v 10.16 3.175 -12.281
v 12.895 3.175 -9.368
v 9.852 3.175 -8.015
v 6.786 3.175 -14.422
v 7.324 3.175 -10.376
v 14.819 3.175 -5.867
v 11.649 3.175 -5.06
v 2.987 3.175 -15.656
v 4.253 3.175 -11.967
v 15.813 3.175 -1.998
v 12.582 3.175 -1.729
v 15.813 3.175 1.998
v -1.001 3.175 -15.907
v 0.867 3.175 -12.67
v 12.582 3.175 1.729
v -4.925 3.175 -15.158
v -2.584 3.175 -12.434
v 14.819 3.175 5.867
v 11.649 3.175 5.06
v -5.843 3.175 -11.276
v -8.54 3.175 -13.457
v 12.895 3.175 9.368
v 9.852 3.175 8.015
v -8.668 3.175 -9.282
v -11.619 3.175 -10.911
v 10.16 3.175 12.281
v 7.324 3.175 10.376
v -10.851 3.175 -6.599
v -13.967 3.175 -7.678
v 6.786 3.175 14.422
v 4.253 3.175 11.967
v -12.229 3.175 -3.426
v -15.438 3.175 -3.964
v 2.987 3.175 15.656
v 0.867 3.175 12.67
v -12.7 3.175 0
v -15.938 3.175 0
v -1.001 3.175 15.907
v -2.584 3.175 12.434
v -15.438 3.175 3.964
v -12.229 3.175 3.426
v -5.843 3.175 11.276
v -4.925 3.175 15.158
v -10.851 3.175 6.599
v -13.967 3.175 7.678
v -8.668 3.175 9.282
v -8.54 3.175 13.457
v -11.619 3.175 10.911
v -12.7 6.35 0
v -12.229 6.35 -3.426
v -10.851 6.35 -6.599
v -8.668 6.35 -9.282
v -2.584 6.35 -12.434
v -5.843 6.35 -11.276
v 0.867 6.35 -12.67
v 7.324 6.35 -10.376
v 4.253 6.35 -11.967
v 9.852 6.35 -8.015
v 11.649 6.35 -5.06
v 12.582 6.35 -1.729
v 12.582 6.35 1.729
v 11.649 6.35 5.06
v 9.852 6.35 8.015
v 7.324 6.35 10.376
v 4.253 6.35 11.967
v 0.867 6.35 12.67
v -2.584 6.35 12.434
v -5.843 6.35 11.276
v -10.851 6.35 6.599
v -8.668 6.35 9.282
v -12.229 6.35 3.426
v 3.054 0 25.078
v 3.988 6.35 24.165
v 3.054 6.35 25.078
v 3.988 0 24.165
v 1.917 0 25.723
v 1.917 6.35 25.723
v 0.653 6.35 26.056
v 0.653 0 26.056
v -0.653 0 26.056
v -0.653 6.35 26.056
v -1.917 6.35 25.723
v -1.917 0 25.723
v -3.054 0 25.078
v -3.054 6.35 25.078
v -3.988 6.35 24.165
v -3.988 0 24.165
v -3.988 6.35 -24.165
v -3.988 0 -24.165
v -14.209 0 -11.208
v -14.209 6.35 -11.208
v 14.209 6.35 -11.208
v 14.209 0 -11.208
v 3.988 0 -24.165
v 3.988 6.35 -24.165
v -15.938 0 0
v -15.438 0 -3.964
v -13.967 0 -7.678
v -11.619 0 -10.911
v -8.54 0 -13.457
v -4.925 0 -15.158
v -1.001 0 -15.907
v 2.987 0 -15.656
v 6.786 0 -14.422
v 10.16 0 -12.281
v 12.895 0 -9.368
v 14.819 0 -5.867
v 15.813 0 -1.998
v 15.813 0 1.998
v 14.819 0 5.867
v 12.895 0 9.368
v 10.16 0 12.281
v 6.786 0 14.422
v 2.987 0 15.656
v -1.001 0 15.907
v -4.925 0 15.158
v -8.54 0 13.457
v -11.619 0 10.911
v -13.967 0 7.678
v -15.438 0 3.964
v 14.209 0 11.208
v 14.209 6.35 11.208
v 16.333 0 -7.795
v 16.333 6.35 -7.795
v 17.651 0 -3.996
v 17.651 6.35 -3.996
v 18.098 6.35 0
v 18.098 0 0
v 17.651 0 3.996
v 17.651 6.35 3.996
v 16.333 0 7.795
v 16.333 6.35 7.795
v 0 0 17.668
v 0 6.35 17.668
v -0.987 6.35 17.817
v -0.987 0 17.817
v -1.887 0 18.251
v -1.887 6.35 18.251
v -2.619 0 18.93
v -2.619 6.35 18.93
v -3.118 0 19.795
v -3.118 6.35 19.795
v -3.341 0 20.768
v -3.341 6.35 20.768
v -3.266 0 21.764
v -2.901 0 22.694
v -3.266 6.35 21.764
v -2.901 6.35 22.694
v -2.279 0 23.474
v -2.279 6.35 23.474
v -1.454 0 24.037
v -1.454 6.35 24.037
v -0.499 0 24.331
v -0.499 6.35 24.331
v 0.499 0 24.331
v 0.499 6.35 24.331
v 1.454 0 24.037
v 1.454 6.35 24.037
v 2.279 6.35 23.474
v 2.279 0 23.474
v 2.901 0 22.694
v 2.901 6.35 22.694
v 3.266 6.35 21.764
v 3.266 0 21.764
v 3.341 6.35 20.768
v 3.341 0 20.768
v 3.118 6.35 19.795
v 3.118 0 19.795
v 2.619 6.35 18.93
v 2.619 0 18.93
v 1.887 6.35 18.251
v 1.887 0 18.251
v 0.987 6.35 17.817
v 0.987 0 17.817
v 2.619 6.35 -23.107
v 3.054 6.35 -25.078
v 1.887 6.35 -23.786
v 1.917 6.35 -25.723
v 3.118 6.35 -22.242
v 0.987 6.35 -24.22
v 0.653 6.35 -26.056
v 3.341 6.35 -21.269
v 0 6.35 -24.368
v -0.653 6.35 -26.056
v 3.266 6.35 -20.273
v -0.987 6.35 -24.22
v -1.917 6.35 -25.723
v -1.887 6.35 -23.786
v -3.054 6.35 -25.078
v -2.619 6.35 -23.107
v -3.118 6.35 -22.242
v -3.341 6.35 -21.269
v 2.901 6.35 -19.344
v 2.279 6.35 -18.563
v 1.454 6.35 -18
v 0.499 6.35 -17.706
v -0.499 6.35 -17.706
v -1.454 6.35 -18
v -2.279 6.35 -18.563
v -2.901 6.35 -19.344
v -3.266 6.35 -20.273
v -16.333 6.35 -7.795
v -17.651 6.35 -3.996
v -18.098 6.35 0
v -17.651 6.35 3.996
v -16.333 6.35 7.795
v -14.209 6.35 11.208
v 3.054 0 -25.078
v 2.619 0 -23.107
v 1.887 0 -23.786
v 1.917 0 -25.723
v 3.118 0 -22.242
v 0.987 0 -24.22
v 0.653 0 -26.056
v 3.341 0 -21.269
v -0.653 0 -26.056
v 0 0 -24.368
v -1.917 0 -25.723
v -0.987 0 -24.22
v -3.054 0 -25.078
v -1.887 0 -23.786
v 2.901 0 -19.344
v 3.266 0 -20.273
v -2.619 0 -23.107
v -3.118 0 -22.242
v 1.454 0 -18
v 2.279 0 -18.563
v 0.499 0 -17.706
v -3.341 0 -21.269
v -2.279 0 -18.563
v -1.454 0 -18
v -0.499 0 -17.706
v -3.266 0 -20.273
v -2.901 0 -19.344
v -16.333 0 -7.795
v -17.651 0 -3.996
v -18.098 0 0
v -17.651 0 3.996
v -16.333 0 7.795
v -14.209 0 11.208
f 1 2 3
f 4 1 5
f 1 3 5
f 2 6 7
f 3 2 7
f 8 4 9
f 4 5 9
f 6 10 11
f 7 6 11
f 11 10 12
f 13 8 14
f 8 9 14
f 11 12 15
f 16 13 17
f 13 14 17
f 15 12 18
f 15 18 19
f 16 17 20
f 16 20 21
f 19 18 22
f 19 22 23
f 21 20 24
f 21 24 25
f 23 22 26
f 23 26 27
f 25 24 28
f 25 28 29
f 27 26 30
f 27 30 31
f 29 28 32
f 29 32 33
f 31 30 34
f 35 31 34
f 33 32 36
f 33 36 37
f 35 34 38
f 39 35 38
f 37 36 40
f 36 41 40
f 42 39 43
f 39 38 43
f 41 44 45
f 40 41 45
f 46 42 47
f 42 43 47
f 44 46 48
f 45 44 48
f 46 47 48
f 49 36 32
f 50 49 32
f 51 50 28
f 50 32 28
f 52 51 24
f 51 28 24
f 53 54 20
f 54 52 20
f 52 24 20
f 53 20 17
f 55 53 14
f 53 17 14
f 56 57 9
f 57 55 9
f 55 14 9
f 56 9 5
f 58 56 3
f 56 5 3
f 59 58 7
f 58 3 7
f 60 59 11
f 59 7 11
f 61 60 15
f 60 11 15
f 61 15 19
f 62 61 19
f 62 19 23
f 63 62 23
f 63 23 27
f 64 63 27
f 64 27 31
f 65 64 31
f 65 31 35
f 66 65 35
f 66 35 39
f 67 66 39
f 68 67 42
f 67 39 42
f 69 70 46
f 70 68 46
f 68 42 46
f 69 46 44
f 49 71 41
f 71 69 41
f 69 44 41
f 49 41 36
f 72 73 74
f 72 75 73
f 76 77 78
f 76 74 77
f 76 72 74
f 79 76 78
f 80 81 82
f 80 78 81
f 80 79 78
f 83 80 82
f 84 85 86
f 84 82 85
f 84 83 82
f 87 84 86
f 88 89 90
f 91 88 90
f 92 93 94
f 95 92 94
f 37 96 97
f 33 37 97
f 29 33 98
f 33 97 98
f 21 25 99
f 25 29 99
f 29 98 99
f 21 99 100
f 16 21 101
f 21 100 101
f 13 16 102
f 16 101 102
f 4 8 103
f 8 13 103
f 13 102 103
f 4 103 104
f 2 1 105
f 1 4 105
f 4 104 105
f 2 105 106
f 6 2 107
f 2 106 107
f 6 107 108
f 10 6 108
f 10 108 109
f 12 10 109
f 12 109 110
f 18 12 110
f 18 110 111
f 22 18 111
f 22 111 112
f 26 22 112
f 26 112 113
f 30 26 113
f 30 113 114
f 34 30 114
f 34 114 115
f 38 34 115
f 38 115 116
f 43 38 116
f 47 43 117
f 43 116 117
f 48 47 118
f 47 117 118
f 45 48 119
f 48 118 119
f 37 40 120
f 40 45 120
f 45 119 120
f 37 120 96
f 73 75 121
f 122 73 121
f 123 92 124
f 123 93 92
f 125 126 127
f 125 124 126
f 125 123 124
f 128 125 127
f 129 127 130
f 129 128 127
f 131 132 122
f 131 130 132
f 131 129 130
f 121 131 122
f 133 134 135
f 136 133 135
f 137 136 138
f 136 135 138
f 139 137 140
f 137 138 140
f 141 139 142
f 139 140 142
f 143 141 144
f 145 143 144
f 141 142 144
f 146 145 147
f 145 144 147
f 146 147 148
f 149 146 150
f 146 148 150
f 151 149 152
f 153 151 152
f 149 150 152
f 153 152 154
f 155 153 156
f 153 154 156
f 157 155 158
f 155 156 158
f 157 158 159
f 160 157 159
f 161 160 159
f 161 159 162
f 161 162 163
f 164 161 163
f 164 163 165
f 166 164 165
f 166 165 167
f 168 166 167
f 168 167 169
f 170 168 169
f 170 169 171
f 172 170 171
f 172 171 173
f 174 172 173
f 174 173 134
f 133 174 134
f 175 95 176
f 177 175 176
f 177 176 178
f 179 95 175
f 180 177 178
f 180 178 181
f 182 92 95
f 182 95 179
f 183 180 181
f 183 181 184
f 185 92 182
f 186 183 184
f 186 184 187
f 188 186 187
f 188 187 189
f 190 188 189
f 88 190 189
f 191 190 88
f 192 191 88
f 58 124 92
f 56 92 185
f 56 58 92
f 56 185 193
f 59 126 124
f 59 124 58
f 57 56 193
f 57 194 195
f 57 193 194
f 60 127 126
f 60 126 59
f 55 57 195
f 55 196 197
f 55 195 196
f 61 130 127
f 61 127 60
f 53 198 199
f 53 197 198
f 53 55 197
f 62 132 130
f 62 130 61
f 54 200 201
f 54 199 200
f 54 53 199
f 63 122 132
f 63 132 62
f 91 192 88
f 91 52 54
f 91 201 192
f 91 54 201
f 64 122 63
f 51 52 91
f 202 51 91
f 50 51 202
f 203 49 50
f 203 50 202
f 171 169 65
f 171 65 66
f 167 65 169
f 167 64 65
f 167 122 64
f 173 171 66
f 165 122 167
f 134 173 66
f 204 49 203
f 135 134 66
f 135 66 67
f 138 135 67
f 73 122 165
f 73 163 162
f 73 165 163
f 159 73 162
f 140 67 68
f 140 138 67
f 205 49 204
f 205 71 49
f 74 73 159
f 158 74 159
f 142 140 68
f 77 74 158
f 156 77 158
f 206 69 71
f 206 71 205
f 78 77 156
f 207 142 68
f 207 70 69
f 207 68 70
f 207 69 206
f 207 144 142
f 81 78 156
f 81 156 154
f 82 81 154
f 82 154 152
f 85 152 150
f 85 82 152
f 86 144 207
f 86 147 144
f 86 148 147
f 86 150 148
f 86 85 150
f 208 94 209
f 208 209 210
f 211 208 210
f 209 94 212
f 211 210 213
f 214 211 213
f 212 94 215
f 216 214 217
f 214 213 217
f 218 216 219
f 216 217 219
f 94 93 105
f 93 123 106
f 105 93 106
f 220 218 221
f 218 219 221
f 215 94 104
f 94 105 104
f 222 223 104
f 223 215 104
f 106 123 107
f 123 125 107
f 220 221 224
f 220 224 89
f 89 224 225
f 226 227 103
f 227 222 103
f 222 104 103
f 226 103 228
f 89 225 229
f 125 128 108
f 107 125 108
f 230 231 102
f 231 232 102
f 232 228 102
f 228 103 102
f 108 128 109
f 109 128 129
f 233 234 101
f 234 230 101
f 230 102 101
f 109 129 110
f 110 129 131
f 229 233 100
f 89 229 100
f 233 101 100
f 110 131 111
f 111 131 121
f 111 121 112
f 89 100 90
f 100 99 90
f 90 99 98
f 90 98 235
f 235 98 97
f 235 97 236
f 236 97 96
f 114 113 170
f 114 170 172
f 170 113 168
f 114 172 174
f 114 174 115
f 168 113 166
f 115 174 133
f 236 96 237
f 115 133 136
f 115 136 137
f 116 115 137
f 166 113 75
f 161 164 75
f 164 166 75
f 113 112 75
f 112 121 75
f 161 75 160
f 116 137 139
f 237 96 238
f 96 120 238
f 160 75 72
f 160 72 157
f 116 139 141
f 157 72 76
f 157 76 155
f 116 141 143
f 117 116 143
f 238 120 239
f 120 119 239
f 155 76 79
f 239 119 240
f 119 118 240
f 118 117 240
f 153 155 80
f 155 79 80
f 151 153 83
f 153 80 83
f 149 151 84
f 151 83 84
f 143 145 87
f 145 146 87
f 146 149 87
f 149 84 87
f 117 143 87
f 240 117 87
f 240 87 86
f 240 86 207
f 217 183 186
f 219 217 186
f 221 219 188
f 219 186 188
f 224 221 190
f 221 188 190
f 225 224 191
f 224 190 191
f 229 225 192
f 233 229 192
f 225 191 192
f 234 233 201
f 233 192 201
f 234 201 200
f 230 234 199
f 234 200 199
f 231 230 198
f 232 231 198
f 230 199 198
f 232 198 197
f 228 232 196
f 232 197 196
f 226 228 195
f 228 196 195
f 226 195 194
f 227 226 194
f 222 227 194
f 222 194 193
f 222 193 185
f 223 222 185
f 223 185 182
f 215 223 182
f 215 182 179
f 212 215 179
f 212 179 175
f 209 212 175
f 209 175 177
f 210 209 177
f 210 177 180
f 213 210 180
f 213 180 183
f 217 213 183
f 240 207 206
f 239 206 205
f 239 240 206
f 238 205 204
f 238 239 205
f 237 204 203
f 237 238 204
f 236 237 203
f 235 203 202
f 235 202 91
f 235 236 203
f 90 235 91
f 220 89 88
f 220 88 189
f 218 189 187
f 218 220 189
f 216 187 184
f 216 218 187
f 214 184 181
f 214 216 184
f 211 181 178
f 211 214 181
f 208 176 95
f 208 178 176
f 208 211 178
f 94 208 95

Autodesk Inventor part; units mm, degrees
ref_plane "YZ Plane" through (0, 0, 0) normal (1, 0, 0) x (0, 1, 0)
ref_plane "XZ Plane" through (0, 0, 0) normal (0, 1, 0) x (-1, 0, 0)
ref_plane "XY Plane" through (0, 0, 0) normal (0, 0, 1) x (1, 0, 0)
sketch "Sketch1" plane through (0, 0, 0) normal (0, 1, 0) x (-1, 0, 0)
  circle A0 centre (0, 0) radius 12.7
  circle A1 centre (0, 0) radius 18.0975
  circle A2 centre (0, 21.0185) radius 5.08 construction
  circle A3 centre (0, -21.0185) radius 5.08 construction
  line L0 (3.9884, 24.1647) -> (14.2088, 11.2084)
  line L1 (-3.9884, 24.1647) -> (-14.2088, 11.2084)
  line L2 (-14.2088, -11.2084) -> (-3.9884, -24.1647)
  line L3 (3.9884, -24.1647) -> (14.2088, -11.2084)
  arc A4 (14.2088, -11.2084) -> (14.2088, 11.2084) centre (0, 0) ccw
  arc A5 (-3.9884, -24.1647) -> (3.9884, -24.1647) centre (0, -21.0185) ccw
  arc A6 (-14.2088, 11.2084) -> (-14.2088, -11.2084) centre (0, 0) ccw
  arc A7 (3.9884, 24.1647) -> (-3.9884, 24.1647) centre (0, 21.0185) ccw
  circle A8 centre (0, 0) radius 15.9385
  dimension "d0" = 25.4
  dimension "d1" = 36.195
  dimension "d2" = 10.16
  dimension "d7" = 31.877
  dimension "d15" = 42.037
extrude "Extrusion1" add sketch "Sketch1" along normal blind 6.35 contours A1 | A1 L1 A7 L0 | L3 A5 L2 A1 | A8
extrude "Extrusion2" cut sketch "Sketch1" along normal blind 3.175 contours A8
hole "Hole1" at (0, 0, 21.0185) at (0, 0, -21.0185) direction (0, 1, 0) diameter 6.7 end through all
properties part number "Retainer" material "ABS Plastic"
